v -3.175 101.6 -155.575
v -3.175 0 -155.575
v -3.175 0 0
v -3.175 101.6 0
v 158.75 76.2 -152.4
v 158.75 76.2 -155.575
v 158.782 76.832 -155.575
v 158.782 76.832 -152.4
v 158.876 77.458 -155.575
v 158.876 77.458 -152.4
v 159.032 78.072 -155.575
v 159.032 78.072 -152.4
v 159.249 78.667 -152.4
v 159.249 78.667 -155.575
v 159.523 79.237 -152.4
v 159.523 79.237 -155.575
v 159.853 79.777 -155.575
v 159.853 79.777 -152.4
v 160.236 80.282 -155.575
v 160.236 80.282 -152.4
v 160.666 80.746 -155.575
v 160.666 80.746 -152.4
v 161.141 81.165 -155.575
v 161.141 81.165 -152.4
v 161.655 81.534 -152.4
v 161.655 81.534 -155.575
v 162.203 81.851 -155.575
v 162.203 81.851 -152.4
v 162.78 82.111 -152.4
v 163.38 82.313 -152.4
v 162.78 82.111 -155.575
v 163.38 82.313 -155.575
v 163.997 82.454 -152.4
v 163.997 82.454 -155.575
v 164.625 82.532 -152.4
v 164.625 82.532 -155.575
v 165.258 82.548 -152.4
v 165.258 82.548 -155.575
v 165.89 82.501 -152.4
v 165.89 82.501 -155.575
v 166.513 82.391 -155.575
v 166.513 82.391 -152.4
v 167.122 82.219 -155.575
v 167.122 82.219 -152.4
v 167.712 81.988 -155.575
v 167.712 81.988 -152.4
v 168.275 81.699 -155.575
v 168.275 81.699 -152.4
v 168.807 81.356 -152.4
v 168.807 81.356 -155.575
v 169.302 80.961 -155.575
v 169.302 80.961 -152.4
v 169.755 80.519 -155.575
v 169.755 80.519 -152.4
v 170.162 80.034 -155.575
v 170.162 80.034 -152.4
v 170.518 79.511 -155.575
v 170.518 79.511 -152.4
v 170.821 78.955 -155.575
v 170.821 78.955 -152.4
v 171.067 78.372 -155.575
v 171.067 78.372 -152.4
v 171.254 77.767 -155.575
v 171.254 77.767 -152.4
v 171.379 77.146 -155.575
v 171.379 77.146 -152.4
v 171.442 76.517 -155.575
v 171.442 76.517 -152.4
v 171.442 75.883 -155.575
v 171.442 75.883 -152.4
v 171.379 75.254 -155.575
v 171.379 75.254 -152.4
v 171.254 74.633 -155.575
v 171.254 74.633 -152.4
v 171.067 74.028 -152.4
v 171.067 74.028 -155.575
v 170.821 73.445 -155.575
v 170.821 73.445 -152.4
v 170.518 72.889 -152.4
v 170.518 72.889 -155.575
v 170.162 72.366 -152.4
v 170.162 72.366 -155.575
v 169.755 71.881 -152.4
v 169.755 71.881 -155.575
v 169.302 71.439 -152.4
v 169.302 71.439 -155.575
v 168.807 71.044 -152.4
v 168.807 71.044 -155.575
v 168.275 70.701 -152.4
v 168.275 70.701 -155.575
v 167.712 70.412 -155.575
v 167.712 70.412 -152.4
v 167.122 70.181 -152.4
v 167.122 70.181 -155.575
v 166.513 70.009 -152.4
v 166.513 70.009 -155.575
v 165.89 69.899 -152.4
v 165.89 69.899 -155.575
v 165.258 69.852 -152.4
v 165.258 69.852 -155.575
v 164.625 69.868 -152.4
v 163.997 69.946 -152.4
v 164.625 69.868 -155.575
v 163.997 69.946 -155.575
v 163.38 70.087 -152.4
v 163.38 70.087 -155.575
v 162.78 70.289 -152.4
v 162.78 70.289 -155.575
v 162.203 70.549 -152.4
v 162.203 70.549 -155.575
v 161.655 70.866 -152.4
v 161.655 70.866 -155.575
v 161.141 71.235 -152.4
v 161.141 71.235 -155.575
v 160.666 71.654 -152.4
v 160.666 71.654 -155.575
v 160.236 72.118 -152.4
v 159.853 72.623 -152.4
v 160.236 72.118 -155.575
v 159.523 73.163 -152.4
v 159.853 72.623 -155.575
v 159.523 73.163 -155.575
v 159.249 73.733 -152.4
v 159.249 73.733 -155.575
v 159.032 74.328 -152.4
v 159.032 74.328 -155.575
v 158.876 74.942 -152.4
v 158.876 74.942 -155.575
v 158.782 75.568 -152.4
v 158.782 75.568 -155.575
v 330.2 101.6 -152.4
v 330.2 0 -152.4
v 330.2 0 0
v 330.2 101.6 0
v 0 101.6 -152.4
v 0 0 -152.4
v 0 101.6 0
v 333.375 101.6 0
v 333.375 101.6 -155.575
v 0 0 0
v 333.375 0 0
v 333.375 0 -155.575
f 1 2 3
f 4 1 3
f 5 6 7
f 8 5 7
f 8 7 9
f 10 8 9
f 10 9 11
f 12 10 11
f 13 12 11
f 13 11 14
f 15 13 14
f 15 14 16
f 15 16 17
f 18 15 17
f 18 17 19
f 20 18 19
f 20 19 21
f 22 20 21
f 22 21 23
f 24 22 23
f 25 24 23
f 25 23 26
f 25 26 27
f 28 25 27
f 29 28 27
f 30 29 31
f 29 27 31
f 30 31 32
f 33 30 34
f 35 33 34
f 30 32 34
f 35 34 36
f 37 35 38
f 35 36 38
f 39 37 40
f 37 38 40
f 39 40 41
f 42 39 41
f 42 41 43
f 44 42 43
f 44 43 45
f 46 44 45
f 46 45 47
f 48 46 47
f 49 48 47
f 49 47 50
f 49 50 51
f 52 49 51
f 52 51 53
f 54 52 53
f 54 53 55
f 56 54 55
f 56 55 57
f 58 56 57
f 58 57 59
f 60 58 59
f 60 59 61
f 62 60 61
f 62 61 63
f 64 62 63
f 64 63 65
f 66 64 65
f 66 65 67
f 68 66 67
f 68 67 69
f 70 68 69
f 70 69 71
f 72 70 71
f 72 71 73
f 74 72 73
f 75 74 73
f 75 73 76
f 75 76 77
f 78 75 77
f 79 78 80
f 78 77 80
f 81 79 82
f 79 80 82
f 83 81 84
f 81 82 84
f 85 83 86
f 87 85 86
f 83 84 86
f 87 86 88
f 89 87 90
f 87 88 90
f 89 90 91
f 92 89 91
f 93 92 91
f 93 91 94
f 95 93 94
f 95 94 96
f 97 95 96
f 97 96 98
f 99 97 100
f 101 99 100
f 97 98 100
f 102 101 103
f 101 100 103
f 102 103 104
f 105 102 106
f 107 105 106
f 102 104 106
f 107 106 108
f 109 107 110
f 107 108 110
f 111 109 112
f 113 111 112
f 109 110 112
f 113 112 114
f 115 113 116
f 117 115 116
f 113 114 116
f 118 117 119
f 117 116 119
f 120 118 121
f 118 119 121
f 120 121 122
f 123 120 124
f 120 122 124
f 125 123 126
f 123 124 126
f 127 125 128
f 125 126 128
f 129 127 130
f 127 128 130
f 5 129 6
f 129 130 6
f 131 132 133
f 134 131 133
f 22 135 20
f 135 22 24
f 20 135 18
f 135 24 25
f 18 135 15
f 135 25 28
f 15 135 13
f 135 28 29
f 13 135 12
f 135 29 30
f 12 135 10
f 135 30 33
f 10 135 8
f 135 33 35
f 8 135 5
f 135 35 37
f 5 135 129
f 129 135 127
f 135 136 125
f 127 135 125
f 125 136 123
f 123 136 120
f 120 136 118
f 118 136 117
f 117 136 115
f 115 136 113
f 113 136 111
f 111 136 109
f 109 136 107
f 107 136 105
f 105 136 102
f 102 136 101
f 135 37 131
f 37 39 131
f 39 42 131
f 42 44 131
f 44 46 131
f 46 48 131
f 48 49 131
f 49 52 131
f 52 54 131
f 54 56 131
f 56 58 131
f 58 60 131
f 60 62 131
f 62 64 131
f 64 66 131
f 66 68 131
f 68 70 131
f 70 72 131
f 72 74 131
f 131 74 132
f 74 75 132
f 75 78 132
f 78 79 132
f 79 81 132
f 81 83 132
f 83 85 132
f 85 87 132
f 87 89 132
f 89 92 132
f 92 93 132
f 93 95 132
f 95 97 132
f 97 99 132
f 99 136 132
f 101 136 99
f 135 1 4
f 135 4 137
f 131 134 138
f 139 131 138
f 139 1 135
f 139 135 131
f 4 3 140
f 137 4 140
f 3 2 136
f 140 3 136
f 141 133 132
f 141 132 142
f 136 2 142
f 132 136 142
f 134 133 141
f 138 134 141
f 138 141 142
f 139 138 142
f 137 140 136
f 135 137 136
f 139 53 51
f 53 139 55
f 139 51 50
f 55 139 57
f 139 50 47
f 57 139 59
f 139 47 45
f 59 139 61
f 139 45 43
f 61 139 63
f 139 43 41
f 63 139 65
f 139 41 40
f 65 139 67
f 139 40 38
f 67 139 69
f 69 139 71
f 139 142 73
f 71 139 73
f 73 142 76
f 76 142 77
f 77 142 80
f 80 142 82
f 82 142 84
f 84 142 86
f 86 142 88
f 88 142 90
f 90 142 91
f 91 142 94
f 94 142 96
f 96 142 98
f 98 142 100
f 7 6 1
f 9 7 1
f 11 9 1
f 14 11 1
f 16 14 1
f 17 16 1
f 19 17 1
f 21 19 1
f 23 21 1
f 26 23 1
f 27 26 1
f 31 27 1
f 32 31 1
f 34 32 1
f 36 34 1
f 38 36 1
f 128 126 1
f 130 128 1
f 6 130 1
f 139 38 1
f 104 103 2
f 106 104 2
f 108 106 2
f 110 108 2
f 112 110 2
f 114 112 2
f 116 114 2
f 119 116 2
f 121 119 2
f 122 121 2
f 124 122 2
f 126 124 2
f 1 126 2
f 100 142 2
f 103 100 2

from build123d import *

# Parameters (mm, degrees)
BOSS_EXTRUDE1_DEPTH = 101.6
CUT_EXTRUDE1_REACH  = 157.575
SKETCH2_R           = 6.35


with BuildPart() as part:
    # Sketch1 → Boss-Extrude1 (new body)
    with BuildSketch(Plane(origin=(0, 0, 0), x_dir=(1, 0, 0), z_dir=(0, 1, 0))):
        Polygon((0, 0), (0, 152.4), (330.2, 152.4), (330.2, 0), (333.375, 0), (333.375, 155.575), (-3.175, 155.575), (-3.175, 0), align=None)
    extrude(amount=BOSS_EXTRUDE1_DEPTH)

    # Sketch2 → Cut-Extrude1 (cut, up to next)
    with BuildSketch(Plane(origin=(0, 0, -155.575), x_dir=(-1, 0, 0), z_dir=(0, 0, -1)), mode=Mode.PRIVATE) as cut_extrude1_sk1:
        with Locations((-165.1, 76.2)):
            Circle(SKETCH2_R)
    cut_extrude1_tool1 = extrude(cut_extrude1_sk1.sketch, amount=-CUT_EXTRUDE1_REACH, mode=Mode.PRIVATE) & part.part
    add(cut_extrude1_tool1.solids().sort_by_distance((165.1, 76.2, -155.575))[0], mode=Mode.SUBTRACT)


solid = part.part
